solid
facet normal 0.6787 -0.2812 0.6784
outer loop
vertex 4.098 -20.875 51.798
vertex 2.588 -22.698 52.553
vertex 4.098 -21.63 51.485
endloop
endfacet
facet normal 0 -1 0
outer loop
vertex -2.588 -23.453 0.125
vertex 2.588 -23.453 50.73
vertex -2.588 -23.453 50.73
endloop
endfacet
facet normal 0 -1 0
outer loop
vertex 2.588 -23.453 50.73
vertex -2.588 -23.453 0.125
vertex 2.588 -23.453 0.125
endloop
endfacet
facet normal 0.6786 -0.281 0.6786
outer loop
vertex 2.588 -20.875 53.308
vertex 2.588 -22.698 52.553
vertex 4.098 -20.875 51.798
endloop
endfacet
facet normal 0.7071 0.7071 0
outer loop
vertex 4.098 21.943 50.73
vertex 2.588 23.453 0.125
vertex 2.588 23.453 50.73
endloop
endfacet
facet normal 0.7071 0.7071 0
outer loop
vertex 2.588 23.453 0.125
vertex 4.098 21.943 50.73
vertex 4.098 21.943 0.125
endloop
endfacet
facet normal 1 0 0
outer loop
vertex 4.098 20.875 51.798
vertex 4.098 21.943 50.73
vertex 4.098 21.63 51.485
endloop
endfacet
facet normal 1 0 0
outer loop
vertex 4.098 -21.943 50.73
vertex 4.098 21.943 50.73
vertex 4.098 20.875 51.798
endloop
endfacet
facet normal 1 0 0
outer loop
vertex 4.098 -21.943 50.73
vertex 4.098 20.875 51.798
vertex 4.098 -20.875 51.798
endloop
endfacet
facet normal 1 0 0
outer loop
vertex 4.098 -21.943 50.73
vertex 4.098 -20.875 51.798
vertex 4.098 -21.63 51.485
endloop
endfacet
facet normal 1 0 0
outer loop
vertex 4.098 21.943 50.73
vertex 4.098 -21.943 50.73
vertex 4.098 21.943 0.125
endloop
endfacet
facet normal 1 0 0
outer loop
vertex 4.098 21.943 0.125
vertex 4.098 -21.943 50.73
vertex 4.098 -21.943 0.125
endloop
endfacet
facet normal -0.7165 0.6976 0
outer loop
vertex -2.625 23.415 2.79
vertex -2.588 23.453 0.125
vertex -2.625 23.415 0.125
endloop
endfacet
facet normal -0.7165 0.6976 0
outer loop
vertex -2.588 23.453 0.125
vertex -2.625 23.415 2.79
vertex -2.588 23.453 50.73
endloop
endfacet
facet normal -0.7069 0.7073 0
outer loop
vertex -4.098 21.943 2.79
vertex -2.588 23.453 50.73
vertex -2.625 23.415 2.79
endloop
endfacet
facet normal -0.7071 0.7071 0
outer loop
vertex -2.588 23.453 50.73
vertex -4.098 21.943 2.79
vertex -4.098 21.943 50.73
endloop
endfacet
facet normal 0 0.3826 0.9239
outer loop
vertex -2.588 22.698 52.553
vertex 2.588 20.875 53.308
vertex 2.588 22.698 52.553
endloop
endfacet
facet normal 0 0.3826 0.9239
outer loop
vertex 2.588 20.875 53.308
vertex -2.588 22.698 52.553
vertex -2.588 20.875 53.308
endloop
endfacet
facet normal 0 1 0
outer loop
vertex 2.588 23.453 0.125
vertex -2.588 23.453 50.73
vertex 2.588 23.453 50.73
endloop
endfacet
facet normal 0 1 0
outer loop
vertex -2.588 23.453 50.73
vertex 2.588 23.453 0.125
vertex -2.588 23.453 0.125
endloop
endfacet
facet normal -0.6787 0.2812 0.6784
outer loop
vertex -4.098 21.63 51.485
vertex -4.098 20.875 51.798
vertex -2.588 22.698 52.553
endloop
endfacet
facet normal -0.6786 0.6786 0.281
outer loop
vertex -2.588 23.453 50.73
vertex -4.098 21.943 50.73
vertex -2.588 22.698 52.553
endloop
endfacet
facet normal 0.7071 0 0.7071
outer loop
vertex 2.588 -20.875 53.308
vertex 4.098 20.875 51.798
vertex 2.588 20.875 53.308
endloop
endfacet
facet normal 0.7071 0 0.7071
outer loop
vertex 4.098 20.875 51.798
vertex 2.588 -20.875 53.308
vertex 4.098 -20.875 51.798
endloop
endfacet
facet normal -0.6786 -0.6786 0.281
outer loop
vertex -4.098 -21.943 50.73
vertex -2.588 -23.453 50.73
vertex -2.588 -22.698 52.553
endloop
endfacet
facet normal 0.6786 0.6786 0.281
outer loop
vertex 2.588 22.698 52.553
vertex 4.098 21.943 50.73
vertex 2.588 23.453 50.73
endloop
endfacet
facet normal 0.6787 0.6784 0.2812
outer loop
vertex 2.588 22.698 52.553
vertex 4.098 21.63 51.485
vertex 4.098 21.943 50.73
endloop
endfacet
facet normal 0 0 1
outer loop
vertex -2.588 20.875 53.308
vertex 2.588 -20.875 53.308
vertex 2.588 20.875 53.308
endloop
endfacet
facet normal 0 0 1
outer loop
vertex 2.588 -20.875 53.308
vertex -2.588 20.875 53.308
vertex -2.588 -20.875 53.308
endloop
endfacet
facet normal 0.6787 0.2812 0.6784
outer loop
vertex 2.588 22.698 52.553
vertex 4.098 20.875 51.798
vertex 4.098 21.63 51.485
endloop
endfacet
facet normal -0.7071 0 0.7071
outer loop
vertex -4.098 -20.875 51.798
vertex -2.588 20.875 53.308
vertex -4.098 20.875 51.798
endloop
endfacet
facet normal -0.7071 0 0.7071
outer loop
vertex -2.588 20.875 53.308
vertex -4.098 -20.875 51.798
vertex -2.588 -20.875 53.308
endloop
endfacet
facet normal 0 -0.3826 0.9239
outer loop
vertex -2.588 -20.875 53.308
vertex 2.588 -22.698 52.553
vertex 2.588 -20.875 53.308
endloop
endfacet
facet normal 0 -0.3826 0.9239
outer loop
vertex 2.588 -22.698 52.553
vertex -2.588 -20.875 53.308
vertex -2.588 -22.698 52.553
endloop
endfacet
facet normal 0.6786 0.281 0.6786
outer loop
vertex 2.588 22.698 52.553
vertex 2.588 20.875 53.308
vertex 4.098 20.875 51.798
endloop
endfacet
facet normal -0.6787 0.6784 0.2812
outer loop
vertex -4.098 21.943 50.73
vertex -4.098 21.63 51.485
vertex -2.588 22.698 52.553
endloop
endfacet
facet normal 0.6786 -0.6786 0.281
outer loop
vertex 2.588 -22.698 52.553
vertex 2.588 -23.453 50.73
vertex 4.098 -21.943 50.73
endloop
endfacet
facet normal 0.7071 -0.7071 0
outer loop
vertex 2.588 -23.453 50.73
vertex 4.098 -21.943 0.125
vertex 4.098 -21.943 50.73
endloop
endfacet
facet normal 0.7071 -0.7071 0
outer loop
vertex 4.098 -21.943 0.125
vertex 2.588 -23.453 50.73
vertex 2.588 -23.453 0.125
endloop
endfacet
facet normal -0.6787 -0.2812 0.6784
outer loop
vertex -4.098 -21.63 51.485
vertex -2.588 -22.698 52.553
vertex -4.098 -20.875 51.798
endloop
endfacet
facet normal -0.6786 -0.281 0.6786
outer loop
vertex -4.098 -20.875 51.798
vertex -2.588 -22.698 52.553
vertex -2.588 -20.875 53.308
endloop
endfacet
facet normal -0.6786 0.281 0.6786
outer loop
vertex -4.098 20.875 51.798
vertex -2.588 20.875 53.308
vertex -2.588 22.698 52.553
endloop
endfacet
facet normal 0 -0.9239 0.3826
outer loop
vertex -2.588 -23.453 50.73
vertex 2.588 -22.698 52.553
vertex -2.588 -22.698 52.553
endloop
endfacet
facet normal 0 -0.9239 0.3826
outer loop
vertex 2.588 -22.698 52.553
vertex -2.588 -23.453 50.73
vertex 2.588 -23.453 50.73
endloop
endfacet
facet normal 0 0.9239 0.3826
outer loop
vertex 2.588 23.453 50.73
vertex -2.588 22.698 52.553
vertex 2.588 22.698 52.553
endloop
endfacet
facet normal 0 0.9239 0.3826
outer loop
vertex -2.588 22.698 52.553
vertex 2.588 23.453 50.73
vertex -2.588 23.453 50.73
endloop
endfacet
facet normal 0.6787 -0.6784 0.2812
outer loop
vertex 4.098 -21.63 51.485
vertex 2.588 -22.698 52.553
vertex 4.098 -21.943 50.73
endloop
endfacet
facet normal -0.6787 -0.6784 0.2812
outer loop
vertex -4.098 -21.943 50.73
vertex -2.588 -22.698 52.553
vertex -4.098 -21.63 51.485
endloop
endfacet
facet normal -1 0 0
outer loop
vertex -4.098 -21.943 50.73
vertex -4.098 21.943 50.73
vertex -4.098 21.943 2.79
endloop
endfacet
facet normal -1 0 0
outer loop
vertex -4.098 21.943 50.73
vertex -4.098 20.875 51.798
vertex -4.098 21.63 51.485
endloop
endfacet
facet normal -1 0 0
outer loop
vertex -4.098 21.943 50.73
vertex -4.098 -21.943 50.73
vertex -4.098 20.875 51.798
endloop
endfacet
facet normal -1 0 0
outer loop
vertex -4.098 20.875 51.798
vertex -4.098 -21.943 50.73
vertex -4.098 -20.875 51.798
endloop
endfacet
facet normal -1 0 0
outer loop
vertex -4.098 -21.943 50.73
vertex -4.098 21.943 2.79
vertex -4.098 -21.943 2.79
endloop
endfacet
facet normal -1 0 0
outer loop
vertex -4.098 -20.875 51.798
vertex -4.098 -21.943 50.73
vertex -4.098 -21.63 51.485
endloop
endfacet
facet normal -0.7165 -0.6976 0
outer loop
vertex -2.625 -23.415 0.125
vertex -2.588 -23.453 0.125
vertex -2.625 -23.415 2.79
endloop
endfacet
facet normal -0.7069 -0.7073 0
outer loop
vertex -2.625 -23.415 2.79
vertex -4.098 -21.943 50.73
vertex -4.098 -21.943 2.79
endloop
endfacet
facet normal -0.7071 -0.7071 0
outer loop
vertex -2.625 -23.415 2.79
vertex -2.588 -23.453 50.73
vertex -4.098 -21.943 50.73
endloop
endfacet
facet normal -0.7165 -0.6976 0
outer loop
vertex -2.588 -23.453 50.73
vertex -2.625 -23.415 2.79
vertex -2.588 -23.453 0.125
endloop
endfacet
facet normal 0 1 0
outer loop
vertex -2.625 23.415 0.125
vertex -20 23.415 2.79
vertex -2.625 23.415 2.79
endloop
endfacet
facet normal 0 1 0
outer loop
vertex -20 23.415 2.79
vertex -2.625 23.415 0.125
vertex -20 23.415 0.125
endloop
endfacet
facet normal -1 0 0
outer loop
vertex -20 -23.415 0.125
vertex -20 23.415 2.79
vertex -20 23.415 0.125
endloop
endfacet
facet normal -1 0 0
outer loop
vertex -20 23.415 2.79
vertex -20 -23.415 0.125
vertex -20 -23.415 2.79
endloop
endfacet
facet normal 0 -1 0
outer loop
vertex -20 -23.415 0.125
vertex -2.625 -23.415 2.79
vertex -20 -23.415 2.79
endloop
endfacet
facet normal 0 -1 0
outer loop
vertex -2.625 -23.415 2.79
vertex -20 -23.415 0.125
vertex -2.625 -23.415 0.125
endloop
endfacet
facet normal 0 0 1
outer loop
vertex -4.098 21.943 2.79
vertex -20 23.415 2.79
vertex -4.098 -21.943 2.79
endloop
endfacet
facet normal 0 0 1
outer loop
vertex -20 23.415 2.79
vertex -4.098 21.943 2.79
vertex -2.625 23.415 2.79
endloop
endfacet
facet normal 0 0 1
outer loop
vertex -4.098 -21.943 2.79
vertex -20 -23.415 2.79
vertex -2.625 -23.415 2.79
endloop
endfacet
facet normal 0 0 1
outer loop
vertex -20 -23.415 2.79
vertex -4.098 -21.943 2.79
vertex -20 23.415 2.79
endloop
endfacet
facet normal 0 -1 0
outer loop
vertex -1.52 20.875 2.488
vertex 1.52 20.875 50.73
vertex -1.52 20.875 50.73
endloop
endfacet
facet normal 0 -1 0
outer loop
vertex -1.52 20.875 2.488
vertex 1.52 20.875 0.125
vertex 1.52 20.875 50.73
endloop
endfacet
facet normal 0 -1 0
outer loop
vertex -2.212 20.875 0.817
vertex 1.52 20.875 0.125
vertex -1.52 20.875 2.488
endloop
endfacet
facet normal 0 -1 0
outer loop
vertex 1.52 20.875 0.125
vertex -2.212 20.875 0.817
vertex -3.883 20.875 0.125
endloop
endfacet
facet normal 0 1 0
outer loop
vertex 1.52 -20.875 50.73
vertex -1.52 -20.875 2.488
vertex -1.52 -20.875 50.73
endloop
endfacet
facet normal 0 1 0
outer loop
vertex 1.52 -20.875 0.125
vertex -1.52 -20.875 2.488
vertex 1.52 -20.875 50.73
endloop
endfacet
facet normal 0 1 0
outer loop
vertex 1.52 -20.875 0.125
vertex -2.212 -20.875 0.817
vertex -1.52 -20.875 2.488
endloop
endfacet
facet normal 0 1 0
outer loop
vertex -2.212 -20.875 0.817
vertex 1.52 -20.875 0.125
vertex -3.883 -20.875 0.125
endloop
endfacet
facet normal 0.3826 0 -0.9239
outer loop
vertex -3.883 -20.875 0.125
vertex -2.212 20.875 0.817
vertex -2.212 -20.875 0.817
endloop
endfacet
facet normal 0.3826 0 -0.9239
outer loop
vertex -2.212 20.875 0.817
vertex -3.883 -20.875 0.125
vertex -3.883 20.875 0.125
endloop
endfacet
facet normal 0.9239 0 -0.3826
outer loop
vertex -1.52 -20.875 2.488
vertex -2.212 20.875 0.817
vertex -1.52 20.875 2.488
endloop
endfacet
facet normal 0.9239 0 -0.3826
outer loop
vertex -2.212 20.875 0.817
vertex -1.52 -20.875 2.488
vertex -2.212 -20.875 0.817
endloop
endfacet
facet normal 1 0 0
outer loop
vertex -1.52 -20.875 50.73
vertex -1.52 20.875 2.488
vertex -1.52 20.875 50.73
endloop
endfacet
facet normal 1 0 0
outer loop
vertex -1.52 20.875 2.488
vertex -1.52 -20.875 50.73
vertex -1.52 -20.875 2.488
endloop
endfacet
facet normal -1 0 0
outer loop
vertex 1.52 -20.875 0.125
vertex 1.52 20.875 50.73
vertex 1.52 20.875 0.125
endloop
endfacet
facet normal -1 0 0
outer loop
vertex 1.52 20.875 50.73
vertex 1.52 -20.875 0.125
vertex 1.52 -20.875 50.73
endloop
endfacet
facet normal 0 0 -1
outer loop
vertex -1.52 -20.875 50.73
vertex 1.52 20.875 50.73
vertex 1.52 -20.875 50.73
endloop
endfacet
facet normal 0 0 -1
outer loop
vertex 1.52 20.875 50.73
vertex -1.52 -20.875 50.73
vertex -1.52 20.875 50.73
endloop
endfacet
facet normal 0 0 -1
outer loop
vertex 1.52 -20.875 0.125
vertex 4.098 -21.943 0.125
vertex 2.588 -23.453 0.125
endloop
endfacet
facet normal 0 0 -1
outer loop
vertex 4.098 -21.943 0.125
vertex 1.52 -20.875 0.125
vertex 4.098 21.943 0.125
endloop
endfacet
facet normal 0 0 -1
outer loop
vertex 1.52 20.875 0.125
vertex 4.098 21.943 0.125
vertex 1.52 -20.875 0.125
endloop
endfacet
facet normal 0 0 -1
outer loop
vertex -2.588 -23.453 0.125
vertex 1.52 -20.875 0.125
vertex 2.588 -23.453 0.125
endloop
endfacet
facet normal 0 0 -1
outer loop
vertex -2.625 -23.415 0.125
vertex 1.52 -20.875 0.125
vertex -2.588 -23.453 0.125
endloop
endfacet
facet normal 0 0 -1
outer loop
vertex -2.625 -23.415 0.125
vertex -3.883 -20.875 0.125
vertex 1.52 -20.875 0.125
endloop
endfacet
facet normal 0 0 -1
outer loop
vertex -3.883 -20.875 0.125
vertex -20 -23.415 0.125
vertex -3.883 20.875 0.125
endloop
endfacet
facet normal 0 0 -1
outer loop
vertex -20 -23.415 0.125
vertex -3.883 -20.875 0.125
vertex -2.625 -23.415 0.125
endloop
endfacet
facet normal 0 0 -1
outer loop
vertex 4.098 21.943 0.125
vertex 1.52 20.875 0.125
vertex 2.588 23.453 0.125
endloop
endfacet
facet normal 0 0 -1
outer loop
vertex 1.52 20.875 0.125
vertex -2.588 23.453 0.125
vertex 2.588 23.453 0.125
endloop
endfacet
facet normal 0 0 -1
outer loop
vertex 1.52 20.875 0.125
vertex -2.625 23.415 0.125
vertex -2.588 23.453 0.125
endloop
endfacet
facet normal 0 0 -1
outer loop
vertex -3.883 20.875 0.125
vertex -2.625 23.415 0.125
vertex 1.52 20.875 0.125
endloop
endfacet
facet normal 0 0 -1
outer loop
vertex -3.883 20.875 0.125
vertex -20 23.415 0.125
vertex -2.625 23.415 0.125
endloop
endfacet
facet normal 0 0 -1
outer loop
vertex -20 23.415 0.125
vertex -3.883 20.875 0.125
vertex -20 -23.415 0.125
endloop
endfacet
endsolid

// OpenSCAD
q = .25; // tolerance
wx = 40.5+1; // width
wy = 51+1; // length
thick = 2.79; // thickness
over = 20; // oversize
$fn = 8;
//$fn=5;

module basis() {
    translate([0, -wy/2, 0]) 
        cube(size=[wx+q, wy+q, thick+q], center=true);
}

module winkel(dy=0) {
    basis();
    translate([0, over/2, (wy+dy)/2]) 
        cube(size=[wx+q+over, thick+q+over, wy+dy+q+over], center=true);
    translate([0, -thick/2, thick/2]) rotate([0, 90, 0]) {
        difference() {
            cylinder(r=(thick), h=wx+q, center=true);
            translate([-thick, -thick, 0]) 
                cylinder(r=thick, h=wx+q+1, center=true);
        }        
    }
    translate([0, 0, 0]) rotate([0, 90, 0]) 
    cylinder(r=(thick+q)/2, h=wx+q, center=true);
}

translate([0,0,-thick/2])
rotate([-90,0,90])
difference() {
    union() {
        minkowski() {
            basis();
            sphere(r=thick);
        }
        translate([0, 0, over/2]) cube(size=[wx+2*thick-q, 3*thick, over], center=true);
    }
    winkel();
}
//#winkel();
